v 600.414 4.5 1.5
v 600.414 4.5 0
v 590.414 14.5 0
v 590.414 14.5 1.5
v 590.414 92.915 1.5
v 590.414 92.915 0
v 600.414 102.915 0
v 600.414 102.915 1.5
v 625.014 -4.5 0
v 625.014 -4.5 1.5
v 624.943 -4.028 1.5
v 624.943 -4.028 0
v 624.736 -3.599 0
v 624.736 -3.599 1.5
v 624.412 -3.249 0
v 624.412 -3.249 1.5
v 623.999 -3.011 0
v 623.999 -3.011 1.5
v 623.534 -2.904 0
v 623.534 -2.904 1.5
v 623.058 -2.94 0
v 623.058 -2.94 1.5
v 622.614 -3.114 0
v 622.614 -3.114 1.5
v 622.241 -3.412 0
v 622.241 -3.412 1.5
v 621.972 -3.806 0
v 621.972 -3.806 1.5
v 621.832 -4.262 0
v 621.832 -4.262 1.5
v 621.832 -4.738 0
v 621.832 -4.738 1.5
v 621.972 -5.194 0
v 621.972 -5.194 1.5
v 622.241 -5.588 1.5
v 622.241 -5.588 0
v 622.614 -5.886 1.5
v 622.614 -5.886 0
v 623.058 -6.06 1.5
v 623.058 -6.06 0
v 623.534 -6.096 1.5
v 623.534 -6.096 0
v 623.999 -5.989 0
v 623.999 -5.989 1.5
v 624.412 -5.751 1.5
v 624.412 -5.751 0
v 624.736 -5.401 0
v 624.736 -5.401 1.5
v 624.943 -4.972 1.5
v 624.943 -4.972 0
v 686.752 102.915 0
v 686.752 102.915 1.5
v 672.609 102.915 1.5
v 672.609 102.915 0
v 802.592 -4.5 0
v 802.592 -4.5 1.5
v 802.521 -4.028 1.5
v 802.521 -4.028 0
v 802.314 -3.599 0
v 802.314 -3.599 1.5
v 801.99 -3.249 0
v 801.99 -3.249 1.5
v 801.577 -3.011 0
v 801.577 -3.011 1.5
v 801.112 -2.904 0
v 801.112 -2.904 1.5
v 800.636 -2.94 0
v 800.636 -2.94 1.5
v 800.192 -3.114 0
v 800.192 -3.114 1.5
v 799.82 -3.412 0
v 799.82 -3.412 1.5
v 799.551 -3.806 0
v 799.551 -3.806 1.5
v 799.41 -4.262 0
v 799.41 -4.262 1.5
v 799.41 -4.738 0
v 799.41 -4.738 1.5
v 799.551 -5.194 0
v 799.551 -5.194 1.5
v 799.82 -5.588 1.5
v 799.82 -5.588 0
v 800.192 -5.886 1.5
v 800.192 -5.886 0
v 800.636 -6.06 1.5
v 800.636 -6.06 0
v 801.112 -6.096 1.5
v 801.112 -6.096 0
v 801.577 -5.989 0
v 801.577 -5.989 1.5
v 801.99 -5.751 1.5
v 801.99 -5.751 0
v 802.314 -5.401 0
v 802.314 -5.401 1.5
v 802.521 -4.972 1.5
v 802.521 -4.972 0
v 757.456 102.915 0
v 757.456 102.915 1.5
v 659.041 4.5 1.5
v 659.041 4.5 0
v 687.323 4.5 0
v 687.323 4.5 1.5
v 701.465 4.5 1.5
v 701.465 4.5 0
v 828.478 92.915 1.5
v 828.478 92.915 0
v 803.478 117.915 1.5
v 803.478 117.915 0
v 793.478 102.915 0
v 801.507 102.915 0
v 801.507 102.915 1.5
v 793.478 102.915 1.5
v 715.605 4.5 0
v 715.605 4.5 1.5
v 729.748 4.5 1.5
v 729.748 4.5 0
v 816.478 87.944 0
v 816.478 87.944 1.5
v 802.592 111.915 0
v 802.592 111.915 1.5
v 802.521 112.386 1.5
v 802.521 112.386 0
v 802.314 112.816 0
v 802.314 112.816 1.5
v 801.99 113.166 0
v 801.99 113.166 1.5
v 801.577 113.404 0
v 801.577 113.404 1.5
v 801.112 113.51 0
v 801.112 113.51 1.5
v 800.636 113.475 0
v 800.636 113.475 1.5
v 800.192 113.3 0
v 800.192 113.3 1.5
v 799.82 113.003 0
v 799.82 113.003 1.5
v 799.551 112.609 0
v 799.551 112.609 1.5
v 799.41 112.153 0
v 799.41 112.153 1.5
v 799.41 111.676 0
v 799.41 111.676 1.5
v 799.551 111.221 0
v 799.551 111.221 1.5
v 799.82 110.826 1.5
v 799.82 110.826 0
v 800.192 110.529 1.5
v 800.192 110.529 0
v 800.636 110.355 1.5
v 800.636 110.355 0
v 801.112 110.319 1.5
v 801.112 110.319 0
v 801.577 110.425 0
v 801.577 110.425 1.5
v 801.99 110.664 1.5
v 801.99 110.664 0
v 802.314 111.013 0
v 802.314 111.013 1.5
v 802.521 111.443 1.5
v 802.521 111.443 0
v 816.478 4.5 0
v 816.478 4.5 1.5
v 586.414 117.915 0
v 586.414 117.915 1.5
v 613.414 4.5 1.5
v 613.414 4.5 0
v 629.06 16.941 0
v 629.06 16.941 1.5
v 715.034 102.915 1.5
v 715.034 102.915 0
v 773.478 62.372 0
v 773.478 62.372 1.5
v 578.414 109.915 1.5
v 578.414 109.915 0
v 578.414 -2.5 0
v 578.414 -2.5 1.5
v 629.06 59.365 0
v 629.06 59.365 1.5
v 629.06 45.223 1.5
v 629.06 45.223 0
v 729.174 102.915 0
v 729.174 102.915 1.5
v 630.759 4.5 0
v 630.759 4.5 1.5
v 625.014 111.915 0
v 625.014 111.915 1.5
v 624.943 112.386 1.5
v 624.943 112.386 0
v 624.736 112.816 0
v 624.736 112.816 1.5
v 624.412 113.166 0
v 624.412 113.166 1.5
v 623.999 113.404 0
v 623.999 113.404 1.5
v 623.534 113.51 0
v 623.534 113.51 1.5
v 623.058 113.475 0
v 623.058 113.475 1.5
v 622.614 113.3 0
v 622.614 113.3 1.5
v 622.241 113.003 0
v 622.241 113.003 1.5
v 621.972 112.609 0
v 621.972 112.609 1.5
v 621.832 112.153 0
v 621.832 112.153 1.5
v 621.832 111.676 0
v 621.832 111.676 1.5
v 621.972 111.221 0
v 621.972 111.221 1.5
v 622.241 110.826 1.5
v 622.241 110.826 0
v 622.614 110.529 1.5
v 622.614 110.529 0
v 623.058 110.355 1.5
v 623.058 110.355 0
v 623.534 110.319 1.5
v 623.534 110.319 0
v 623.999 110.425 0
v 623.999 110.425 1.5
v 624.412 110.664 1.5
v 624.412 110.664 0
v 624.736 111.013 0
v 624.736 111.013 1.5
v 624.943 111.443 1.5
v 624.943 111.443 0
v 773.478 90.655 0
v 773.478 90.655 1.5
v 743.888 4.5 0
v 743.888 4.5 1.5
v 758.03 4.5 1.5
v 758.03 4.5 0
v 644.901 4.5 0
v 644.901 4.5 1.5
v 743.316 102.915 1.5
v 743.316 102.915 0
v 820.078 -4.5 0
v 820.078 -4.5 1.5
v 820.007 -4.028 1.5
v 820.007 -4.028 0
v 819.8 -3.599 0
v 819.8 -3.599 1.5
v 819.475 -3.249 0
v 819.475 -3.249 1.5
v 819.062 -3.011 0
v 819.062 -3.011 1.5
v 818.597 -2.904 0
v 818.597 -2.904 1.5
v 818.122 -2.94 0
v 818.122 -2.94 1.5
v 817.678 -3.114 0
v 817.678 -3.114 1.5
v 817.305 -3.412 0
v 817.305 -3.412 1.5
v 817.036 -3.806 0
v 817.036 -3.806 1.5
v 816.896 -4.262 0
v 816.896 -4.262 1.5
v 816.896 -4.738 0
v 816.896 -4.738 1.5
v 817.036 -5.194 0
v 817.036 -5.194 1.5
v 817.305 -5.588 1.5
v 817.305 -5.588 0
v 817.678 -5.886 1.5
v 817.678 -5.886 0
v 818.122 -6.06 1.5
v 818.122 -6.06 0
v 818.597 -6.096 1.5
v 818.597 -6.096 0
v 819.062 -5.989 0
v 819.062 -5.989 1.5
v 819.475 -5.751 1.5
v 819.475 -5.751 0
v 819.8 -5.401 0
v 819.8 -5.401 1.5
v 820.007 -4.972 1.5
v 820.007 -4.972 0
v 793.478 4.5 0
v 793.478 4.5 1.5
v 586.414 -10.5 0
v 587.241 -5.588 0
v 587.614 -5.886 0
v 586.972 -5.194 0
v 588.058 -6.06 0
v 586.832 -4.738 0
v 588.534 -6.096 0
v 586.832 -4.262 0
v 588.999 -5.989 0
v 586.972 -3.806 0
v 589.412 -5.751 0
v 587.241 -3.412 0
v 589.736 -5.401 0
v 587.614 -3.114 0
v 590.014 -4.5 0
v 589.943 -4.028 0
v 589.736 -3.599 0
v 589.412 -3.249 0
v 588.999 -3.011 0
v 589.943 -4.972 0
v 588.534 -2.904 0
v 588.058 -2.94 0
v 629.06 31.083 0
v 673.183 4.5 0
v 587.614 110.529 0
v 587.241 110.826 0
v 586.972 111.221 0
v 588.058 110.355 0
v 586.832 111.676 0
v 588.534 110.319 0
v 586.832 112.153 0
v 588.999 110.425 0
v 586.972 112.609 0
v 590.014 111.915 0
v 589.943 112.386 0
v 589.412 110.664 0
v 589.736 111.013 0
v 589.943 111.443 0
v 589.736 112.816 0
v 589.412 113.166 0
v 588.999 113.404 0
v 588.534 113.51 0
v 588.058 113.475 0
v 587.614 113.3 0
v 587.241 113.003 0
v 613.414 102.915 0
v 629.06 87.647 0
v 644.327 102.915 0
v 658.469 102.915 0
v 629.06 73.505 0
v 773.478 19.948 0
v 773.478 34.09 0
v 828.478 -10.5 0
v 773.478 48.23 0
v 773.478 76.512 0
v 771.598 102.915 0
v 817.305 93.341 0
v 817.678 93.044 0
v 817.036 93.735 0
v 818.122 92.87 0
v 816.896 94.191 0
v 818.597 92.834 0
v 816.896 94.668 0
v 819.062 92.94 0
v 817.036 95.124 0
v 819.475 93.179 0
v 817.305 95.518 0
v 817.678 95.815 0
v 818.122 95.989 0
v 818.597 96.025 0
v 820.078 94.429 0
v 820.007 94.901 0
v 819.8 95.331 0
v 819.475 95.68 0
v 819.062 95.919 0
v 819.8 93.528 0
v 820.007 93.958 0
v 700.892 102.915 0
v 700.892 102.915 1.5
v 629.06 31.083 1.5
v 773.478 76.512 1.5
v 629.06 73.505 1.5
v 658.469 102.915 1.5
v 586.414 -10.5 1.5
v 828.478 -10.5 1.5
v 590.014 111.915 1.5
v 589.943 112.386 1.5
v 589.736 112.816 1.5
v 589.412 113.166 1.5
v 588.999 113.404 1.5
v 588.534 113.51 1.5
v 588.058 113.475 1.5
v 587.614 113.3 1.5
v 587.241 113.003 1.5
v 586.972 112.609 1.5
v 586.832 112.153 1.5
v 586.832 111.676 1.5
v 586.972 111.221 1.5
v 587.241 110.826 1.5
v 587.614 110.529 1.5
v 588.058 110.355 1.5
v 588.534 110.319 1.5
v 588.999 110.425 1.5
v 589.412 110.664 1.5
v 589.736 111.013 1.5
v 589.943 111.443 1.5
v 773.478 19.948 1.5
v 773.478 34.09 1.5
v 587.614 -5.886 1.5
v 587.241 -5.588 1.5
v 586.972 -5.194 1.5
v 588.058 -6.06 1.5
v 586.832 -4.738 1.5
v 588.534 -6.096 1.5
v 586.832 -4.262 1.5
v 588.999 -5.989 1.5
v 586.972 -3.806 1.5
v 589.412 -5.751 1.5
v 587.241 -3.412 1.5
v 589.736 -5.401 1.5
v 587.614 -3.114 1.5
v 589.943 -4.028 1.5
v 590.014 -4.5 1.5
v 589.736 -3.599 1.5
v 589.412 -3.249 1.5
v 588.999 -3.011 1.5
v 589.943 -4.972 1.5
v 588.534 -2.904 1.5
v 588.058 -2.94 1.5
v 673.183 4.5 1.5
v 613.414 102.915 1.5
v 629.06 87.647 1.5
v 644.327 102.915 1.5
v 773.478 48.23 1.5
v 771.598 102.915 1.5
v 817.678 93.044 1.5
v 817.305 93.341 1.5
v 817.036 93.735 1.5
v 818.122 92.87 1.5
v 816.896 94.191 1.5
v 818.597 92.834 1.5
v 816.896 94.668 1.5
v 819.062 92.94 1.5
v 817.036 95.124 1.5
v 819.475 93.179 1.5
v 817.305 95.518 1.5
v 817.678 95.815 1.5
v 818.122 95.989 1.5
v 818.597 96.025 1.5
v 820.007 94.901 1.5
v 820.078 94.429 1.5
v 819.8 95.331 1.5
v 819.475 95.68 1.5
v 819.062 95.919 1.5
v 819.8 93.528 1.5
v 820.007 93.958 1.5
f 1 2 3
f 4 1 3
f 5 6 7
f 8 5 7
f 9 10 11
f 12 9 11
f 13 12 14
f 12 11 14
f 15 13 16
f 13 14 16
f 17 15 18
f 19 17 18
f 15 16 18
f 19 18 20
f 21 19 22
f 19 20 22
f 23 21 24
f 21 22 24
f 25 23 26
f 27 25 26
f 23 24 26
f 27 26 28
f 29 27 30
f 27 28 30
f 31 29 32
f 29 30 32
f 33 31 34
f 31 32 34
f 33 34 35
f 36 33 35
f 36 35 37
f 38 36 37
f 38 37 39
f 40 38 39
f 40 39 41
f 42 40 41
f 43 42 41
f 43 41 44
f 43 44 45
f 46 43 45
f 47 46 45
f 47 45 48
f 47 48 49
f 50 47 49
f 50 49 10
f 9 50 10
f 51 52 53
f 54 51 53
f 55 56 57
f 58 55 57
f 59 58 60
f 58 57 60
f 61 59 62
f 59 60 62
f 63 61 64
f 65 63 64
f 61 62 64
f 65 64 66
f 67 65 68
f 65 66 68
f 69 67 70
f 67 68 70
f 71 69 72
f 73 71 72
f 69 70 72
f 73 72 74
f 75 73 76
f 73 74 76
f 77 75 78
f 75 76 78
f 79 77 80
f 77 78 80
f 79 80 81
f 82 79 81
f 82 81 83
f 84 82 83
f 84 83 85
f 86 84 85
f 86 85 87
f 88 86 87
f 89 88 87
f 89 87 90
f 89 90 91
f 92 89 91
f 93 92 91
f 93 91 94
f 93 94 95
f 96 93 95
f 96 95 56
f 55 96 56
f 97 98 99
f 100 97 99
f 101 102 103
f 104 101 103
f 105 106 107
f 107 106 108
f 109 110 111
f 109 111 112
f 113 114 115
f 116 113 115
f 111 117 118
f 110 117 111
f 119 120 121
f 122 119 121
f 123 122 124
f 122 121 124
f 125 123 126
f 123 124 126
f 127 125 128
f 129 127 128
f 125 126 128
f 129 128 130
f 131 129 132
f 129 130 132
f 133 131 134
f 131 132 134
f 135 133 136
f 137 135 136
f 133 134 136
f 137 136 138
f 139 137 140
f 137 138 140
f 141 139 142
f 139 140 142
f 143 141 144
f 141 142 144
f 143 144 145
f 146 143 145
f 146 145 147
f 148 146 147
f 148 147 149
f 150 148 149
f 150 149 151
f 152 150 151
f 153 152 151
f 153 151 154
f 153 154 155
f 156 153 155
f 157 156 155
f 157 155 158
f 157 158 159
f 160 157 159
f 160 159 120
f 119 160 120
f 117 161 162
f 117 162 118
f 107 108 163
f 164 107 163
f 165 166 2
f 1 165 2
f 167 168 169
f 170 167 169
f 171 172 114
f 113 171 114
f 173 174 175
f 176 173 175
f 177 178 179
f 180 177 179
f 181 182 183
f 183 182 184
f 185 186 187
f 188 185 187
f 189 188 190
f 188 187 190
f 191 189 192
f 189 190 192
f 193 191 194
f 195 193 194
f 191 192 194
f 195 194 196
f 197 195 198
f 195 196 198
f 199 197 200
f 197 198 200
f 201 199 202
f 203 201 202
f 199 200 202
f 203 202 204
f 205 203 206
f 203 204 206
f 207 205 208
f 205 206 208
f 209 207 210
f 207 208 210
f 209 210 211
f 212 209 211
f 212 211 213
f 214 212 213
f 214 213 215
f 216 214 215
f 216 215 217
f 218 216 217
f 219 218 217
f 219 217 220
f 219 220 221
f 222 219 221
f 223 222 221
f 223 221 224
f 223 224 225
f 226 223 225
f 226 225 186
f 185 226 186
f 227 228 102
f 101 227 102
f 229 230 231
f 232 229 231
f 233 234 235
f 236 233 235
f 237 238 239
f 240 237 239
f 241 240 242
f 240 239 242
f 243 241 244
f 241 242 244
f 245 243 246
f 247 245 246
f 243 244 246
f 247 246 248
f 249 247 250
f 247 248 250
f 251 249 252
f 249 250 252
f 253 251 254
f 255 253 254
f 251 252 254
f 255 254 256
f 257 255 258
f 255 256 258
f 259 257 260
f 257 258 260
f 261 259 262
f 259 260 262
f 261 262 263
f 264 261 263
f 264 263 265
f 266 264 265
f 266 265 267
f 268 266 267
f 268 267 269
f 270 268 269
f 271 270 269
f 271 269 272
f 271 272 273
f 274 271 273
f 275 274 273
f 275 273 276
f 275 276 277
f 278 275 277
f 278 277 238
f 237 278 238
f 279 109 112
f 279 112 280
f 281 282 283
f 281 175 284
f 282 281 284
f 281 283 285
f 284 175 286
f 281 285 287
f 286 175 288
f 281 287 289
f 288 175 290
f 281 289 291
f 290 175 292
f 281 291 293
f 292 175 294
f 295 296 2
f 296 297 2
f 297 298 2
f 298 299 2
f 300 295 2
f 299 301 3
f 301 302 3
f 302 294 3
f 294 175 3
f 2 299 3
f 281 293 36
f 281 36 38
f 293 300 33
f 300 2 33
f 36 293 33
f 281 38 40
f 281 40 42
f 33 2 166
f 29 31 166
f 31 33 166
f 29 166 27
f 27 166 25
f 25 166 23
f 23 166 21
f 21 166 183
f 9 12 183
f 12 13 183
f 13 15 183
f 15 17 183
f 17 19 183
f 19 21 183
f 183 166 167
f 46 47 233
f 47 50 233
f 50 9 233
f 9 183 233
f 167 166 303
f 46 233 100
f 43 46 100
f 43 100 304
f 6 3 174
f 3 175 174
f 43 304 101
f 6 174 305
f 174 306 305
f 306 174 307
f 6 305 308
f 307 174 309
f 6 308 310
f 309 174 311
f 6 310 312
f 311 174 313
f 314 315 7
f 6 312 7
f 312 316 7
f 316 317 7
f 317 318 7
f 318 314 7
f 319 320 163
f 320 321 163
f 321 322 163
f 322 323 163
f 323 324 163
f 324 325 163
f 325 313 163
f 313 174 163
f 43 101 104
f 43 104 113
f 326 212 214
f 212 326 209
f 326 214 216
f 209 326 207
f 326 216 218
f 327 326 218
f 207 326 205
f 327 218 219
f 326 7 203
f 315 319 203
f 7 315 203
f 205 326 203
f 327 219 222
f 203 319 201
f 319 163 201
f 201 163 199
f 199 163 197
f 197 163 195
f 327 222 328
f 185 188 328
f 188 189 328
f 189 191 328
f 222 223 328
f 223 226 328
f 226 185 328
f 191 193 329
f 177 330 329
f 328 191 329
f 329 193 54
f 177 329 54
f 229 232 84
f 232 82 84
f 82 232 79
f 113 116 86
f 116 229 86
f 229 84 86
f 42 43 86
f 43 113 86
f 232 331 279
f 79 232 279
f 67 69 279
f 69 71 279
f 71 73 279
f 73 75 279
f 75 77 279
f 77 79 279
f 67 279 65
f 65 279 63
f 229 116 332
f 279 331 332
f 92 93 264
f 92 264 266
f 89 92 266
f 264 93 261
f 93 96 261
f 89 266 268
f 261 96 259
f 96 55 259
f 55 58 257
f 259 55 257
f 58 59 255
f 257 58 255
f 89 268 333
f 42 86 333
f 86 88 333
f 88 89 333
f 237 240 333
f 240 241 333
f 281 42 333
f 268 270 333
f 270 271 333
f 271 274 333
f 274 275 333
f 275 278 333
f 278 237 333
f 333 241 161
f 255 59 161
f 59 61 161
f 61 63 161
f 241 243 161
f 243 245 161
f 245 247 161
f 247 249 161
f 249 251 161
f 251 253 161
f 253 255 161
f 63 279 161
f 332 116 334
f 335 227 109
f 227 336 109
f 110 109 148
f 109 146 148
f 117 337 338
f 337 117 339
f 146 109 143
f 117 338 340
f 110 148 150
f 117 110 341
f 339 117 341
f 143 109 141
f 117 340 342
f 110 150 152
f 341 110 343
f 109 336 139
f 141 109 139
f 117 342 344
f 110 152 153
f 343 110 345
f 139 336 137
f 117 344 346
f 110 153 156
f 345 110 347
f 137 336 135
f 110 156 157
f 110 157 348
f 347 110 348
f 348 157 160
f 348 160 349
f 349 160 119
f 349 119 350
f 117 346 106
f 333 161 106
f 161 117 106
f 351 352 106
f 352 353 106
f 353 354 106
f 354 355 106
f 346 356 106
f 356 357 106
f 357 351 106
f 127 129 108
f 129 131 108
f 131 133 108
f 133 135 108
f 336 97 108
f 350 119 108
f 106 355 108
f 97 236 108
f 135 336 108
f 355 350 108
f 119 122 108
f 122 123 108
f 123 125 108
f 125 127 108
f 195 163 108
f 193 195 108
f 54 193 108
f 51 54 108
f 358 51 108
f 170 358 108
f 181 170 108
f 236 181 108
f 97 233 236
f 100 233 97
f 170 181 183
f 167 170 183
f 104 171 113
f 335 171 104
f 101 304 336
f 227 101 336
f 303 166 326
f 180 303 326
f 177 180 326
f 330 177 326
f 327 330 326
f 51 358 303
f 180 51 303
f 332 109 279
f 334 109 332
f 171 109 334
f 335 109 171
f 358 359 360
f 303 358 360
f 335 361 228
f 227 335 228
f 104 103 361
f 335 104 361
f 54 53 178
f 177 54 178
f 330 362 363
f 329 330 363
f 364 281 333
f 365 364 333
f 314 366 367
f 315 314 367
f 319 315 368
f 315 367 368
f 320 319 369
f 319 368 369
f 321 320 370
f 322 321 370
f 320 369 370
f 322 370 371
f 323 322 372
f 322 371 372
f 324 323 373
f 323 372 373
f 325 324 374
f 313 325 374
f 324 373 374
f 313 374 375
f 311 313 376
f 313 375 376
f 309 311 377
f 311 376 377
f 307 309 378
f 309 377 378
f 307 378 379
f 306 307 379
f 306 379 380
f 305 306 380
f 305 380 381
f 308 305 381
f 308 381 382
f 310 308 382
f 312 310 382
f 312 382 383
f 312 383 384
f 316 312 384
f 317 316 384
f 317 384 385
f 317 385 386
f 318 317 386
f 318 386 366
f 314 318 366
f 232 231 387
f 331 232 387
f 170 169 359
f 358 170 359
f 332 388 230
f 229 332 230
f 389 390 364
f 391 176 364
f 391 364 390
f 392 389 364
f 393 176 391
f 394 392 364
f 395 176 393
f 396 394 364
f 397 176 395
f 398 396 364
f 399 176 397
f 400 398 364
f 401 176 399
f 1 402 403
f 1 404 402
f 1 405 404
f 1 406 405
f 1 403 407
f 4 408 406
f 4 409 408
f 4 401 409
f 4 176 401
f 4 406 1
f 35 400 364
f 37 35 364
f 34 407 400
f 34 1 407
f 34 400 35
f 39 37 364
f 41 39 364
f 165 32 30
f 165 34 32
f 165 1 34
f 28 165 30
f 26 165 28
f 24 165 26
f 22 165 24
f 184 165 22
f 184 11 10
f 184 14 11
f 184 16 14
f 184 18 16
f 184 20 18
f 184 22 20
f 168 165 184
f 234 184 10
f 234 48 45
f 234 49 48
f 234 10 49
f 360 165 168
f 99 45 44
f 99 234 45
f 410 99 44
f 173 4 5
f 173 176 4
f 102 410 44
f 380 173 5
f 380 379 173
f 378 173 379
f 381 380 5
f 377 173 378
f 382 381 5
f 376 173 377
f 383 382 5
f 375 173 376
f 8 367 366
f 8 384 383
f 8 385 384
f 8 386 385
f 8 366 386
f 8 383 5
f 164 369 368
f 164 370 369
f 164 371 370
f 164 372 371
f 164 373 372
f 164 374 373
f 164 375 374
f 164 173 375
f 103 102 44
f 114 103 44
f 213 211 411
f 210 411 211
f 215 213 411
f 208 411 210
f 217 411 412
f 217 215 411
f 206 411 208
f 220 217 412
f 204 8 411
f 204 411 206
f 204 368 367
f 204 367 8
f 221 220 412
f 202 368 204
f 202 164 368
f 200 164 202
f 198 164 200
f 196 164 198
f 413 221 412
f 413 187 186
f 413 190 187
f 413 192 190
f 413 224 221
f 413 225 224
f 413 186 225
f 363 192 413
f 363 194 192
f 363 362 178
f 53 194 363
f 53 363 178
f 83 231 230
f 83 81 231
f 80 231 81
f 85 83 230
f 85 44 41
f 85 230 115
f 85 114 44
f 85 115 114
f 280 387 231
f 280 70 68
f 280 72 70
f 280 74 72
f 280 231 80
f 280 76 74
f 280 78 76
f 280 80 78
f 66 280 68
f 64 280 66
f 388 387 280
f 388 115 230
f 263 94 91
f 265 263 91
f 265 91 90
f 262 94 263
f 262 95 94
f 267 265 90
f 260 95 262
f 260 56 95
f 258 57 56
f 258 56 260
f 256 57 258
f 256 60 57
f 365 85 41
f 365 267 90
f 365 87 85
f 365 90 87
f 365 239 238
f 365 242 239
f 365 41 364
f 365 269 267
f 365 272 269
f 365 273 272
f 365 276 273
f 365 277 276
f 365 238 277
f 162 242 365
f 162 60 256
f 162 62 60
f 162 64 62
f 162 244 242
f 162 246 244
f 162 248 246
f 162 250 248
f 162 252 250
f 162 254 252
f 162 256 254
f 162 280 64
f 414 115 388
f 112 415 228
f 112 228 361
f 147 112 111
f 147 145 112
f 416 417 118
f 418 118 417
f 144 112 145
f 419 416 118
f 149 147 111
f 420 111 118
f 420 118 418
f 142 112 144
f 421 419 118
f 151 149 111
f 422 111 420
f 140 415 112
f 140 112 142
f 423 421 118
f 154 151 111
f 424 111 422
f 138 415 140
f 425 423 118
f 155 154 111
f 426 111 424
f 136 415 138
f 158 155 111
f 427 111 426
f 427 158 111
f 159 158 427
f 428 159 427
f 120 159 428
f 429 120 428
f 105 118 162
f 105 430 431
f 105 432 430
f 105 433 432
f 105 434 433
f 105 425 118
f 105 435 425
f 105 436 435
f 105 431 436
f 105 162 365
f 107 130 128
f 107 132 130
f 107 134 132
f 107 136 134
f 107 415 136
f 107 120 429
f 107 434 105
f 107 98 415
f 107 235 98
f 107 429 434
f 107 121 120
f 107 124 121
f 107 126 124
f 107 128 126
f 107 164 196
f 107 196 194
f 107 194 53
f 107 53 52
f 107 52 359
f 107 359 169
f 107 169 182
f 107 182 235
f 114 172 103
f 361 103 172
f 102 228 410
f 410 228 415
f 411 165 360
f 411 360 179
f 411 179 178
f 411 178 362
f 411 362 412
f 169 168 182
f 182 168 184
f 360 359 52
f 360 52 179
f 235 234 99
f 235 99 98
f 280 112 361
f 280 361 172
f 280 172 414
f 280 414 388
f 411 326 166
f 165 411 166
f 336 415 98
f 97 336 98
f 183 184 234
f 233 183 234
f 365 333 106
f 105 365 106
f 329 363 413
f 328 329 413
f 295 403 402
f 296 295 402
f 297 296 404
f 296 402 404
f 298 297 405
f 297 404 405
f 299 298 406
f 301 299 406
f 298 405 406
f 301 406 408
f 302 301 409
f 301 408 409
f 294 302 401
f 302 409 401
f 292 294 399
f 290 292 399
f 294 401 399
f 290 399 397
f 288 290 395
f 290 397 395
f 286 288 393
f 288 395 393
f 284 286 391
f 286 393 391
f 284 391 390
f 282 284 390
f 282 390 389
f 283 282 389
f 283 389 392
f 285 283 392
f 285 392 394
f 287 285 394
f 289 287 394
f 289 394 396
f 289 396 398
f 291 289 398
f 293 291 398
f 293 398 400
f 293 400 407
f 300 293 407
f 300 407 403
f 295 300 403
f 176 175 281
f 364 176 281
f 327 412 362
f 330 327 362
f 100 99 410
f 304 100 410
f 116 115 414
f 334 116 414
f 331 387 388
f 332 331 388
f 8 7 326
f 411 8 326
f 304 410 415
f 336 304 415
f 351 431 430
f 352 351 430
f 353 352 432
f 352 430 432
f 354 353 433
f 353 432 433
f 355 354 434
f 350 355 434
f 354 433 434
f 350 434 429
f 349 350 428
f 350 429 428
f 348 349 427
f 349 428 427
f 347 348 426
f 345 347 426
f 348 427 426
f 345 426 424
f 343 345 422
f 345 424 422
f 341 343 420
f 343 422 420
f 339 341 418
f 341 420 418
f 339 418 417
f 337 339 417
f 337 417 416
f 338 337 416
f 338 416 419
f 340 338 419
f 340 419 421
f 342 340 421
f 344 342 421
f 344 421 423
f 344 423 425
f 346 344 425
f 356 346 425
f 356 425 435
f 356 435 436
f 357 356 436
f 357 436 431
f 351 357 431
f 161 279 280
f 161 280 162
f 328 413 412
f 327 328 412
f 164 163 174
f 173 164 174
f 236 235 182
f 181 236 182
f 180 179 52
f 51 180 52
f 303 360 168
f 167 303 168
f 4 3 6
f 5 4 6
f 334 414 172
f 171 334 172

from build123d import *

# Parameters (mm, degrees)
BOSS_EXTRUDE1_DEPTH = 1.5
SKETCH5_R           = 1.6
CUT_EXTRUDE2_DEPTH  = 3.5
CUT_EXTRUDE4_DEPTH  = 10


with BuildPart() as part:
    # Sketch2 → Boss-Extrude1 (new body)
    with BuildSketch(Plane.XY):
        Polygon((803.47776474, 117.914742868), (586.414001465, 117.914742868), (578.414001465, 109.914742868), (578.414001465, -2.5), (586.414001465, -10.5), (828.47776474, -10.5), (828.47776474, 92.914742868), align=None)
        Polygon((613.414001465, 102.914742868), (613.414001465, 4.5), (600.414001465, 4.5), (590.414001465, 14.5), (590.414001465, 92.914742868), (600.414001465, 102.914742868), align=None, mode=Mode.SUBTRACT)
        Polygon((793.47776474, 4.5), (816.47776474, 4.5), (816.47776474, 87.94418012), (801.507201992, 102.914742868), (793.47776474, 102.914742868), align=None, mode=Mode.SUBTRACT)
    extrude(amount=BOSS_EXTRUDE1_DEPTH)

    # Sketch5 → Cut-Extrude2 (cut)
    with BuildSketch(Plane.XY.offset(1.5)):
        with Locations((588.414001465, 111.914742868)):
            Circle(SKETCH5_R)
        with Locations((588.414001465, -4.5)):
            Circle(SKETCH5_R)
        with Locations((818.47776474, -4.5)):
            Circle(SKETCH5_R)
        with Locations((623.414001465, 111.914742868)):
            Circle(SKETCH5_R)
        with Locations((623.414001465, -4.5)):
            Circle(SKETCH5_R)
        with Locations((800.992483366, 111.914742868)):
            Circle(SKETCH5_R)
        with Locations((818.47776474, 94.429461494)):
            Circle(SKETCH5_R)
        with Locations((800.992483366, -4.5)):
            Circle(SKETCH5_R)
    extrude(amount=-CUT_EXTRUDE2_DEPTH, mode=Mode.SUBTRACT)

    # Sketch6 → Cut-Extrude4 (cut)
    with BuildSketch(Plane.XY.offset(1.5)):
        Polygon((658.469461081, 102.914742868), (644.327325457, 102.914742868), (629.059768774, 87.647186185), (629.059768774, 73.505050562), align=None)
        Polygon((686.751596705, 102.914742868), (672.609461081, 102.914742868), (629.059768774, 59.365050562), (629.059768774, 45.222914938), align=None)
        Polygon((715.033732329, 102.914742868), (700.891596705, 102.914742868), (629.059768774, 31.082914938), (629.059768774, 16.940779314), align=None)
        Polygon((743.315867952, 102.914742868), (729.173732329, 102.914742868), (630.75898946, 4.5), (644.901125084, 4.5), align=None)
        Polygon((771.598003576, 102.914742868), (757.455867952, 102.914742868), (659.041125084, 4.5), (673.183260708, 4.5), align=None)
        Polygon((773.47776474, 76.512368409), (773.47776474, 90.654504032), (687.323260708, 4.5), (701.465396331, 4.5), align=None)
        Polygon((773.47776474, 48.230232785), (773.47776474, 62.372368409), (715.605396331, 4.5), (729.747531955, 4.5), align=None)
        Polygon((773.47776474, 19.948097161), (773.47776474, 34.090232785), (743.887531955, 4.5), (758.029667579, 4.5), align=None)
    extrude(amount=-CUT_EXTRUDE4_DEPTH, mode=Mode.SUBTRACT)


solid = part.part
